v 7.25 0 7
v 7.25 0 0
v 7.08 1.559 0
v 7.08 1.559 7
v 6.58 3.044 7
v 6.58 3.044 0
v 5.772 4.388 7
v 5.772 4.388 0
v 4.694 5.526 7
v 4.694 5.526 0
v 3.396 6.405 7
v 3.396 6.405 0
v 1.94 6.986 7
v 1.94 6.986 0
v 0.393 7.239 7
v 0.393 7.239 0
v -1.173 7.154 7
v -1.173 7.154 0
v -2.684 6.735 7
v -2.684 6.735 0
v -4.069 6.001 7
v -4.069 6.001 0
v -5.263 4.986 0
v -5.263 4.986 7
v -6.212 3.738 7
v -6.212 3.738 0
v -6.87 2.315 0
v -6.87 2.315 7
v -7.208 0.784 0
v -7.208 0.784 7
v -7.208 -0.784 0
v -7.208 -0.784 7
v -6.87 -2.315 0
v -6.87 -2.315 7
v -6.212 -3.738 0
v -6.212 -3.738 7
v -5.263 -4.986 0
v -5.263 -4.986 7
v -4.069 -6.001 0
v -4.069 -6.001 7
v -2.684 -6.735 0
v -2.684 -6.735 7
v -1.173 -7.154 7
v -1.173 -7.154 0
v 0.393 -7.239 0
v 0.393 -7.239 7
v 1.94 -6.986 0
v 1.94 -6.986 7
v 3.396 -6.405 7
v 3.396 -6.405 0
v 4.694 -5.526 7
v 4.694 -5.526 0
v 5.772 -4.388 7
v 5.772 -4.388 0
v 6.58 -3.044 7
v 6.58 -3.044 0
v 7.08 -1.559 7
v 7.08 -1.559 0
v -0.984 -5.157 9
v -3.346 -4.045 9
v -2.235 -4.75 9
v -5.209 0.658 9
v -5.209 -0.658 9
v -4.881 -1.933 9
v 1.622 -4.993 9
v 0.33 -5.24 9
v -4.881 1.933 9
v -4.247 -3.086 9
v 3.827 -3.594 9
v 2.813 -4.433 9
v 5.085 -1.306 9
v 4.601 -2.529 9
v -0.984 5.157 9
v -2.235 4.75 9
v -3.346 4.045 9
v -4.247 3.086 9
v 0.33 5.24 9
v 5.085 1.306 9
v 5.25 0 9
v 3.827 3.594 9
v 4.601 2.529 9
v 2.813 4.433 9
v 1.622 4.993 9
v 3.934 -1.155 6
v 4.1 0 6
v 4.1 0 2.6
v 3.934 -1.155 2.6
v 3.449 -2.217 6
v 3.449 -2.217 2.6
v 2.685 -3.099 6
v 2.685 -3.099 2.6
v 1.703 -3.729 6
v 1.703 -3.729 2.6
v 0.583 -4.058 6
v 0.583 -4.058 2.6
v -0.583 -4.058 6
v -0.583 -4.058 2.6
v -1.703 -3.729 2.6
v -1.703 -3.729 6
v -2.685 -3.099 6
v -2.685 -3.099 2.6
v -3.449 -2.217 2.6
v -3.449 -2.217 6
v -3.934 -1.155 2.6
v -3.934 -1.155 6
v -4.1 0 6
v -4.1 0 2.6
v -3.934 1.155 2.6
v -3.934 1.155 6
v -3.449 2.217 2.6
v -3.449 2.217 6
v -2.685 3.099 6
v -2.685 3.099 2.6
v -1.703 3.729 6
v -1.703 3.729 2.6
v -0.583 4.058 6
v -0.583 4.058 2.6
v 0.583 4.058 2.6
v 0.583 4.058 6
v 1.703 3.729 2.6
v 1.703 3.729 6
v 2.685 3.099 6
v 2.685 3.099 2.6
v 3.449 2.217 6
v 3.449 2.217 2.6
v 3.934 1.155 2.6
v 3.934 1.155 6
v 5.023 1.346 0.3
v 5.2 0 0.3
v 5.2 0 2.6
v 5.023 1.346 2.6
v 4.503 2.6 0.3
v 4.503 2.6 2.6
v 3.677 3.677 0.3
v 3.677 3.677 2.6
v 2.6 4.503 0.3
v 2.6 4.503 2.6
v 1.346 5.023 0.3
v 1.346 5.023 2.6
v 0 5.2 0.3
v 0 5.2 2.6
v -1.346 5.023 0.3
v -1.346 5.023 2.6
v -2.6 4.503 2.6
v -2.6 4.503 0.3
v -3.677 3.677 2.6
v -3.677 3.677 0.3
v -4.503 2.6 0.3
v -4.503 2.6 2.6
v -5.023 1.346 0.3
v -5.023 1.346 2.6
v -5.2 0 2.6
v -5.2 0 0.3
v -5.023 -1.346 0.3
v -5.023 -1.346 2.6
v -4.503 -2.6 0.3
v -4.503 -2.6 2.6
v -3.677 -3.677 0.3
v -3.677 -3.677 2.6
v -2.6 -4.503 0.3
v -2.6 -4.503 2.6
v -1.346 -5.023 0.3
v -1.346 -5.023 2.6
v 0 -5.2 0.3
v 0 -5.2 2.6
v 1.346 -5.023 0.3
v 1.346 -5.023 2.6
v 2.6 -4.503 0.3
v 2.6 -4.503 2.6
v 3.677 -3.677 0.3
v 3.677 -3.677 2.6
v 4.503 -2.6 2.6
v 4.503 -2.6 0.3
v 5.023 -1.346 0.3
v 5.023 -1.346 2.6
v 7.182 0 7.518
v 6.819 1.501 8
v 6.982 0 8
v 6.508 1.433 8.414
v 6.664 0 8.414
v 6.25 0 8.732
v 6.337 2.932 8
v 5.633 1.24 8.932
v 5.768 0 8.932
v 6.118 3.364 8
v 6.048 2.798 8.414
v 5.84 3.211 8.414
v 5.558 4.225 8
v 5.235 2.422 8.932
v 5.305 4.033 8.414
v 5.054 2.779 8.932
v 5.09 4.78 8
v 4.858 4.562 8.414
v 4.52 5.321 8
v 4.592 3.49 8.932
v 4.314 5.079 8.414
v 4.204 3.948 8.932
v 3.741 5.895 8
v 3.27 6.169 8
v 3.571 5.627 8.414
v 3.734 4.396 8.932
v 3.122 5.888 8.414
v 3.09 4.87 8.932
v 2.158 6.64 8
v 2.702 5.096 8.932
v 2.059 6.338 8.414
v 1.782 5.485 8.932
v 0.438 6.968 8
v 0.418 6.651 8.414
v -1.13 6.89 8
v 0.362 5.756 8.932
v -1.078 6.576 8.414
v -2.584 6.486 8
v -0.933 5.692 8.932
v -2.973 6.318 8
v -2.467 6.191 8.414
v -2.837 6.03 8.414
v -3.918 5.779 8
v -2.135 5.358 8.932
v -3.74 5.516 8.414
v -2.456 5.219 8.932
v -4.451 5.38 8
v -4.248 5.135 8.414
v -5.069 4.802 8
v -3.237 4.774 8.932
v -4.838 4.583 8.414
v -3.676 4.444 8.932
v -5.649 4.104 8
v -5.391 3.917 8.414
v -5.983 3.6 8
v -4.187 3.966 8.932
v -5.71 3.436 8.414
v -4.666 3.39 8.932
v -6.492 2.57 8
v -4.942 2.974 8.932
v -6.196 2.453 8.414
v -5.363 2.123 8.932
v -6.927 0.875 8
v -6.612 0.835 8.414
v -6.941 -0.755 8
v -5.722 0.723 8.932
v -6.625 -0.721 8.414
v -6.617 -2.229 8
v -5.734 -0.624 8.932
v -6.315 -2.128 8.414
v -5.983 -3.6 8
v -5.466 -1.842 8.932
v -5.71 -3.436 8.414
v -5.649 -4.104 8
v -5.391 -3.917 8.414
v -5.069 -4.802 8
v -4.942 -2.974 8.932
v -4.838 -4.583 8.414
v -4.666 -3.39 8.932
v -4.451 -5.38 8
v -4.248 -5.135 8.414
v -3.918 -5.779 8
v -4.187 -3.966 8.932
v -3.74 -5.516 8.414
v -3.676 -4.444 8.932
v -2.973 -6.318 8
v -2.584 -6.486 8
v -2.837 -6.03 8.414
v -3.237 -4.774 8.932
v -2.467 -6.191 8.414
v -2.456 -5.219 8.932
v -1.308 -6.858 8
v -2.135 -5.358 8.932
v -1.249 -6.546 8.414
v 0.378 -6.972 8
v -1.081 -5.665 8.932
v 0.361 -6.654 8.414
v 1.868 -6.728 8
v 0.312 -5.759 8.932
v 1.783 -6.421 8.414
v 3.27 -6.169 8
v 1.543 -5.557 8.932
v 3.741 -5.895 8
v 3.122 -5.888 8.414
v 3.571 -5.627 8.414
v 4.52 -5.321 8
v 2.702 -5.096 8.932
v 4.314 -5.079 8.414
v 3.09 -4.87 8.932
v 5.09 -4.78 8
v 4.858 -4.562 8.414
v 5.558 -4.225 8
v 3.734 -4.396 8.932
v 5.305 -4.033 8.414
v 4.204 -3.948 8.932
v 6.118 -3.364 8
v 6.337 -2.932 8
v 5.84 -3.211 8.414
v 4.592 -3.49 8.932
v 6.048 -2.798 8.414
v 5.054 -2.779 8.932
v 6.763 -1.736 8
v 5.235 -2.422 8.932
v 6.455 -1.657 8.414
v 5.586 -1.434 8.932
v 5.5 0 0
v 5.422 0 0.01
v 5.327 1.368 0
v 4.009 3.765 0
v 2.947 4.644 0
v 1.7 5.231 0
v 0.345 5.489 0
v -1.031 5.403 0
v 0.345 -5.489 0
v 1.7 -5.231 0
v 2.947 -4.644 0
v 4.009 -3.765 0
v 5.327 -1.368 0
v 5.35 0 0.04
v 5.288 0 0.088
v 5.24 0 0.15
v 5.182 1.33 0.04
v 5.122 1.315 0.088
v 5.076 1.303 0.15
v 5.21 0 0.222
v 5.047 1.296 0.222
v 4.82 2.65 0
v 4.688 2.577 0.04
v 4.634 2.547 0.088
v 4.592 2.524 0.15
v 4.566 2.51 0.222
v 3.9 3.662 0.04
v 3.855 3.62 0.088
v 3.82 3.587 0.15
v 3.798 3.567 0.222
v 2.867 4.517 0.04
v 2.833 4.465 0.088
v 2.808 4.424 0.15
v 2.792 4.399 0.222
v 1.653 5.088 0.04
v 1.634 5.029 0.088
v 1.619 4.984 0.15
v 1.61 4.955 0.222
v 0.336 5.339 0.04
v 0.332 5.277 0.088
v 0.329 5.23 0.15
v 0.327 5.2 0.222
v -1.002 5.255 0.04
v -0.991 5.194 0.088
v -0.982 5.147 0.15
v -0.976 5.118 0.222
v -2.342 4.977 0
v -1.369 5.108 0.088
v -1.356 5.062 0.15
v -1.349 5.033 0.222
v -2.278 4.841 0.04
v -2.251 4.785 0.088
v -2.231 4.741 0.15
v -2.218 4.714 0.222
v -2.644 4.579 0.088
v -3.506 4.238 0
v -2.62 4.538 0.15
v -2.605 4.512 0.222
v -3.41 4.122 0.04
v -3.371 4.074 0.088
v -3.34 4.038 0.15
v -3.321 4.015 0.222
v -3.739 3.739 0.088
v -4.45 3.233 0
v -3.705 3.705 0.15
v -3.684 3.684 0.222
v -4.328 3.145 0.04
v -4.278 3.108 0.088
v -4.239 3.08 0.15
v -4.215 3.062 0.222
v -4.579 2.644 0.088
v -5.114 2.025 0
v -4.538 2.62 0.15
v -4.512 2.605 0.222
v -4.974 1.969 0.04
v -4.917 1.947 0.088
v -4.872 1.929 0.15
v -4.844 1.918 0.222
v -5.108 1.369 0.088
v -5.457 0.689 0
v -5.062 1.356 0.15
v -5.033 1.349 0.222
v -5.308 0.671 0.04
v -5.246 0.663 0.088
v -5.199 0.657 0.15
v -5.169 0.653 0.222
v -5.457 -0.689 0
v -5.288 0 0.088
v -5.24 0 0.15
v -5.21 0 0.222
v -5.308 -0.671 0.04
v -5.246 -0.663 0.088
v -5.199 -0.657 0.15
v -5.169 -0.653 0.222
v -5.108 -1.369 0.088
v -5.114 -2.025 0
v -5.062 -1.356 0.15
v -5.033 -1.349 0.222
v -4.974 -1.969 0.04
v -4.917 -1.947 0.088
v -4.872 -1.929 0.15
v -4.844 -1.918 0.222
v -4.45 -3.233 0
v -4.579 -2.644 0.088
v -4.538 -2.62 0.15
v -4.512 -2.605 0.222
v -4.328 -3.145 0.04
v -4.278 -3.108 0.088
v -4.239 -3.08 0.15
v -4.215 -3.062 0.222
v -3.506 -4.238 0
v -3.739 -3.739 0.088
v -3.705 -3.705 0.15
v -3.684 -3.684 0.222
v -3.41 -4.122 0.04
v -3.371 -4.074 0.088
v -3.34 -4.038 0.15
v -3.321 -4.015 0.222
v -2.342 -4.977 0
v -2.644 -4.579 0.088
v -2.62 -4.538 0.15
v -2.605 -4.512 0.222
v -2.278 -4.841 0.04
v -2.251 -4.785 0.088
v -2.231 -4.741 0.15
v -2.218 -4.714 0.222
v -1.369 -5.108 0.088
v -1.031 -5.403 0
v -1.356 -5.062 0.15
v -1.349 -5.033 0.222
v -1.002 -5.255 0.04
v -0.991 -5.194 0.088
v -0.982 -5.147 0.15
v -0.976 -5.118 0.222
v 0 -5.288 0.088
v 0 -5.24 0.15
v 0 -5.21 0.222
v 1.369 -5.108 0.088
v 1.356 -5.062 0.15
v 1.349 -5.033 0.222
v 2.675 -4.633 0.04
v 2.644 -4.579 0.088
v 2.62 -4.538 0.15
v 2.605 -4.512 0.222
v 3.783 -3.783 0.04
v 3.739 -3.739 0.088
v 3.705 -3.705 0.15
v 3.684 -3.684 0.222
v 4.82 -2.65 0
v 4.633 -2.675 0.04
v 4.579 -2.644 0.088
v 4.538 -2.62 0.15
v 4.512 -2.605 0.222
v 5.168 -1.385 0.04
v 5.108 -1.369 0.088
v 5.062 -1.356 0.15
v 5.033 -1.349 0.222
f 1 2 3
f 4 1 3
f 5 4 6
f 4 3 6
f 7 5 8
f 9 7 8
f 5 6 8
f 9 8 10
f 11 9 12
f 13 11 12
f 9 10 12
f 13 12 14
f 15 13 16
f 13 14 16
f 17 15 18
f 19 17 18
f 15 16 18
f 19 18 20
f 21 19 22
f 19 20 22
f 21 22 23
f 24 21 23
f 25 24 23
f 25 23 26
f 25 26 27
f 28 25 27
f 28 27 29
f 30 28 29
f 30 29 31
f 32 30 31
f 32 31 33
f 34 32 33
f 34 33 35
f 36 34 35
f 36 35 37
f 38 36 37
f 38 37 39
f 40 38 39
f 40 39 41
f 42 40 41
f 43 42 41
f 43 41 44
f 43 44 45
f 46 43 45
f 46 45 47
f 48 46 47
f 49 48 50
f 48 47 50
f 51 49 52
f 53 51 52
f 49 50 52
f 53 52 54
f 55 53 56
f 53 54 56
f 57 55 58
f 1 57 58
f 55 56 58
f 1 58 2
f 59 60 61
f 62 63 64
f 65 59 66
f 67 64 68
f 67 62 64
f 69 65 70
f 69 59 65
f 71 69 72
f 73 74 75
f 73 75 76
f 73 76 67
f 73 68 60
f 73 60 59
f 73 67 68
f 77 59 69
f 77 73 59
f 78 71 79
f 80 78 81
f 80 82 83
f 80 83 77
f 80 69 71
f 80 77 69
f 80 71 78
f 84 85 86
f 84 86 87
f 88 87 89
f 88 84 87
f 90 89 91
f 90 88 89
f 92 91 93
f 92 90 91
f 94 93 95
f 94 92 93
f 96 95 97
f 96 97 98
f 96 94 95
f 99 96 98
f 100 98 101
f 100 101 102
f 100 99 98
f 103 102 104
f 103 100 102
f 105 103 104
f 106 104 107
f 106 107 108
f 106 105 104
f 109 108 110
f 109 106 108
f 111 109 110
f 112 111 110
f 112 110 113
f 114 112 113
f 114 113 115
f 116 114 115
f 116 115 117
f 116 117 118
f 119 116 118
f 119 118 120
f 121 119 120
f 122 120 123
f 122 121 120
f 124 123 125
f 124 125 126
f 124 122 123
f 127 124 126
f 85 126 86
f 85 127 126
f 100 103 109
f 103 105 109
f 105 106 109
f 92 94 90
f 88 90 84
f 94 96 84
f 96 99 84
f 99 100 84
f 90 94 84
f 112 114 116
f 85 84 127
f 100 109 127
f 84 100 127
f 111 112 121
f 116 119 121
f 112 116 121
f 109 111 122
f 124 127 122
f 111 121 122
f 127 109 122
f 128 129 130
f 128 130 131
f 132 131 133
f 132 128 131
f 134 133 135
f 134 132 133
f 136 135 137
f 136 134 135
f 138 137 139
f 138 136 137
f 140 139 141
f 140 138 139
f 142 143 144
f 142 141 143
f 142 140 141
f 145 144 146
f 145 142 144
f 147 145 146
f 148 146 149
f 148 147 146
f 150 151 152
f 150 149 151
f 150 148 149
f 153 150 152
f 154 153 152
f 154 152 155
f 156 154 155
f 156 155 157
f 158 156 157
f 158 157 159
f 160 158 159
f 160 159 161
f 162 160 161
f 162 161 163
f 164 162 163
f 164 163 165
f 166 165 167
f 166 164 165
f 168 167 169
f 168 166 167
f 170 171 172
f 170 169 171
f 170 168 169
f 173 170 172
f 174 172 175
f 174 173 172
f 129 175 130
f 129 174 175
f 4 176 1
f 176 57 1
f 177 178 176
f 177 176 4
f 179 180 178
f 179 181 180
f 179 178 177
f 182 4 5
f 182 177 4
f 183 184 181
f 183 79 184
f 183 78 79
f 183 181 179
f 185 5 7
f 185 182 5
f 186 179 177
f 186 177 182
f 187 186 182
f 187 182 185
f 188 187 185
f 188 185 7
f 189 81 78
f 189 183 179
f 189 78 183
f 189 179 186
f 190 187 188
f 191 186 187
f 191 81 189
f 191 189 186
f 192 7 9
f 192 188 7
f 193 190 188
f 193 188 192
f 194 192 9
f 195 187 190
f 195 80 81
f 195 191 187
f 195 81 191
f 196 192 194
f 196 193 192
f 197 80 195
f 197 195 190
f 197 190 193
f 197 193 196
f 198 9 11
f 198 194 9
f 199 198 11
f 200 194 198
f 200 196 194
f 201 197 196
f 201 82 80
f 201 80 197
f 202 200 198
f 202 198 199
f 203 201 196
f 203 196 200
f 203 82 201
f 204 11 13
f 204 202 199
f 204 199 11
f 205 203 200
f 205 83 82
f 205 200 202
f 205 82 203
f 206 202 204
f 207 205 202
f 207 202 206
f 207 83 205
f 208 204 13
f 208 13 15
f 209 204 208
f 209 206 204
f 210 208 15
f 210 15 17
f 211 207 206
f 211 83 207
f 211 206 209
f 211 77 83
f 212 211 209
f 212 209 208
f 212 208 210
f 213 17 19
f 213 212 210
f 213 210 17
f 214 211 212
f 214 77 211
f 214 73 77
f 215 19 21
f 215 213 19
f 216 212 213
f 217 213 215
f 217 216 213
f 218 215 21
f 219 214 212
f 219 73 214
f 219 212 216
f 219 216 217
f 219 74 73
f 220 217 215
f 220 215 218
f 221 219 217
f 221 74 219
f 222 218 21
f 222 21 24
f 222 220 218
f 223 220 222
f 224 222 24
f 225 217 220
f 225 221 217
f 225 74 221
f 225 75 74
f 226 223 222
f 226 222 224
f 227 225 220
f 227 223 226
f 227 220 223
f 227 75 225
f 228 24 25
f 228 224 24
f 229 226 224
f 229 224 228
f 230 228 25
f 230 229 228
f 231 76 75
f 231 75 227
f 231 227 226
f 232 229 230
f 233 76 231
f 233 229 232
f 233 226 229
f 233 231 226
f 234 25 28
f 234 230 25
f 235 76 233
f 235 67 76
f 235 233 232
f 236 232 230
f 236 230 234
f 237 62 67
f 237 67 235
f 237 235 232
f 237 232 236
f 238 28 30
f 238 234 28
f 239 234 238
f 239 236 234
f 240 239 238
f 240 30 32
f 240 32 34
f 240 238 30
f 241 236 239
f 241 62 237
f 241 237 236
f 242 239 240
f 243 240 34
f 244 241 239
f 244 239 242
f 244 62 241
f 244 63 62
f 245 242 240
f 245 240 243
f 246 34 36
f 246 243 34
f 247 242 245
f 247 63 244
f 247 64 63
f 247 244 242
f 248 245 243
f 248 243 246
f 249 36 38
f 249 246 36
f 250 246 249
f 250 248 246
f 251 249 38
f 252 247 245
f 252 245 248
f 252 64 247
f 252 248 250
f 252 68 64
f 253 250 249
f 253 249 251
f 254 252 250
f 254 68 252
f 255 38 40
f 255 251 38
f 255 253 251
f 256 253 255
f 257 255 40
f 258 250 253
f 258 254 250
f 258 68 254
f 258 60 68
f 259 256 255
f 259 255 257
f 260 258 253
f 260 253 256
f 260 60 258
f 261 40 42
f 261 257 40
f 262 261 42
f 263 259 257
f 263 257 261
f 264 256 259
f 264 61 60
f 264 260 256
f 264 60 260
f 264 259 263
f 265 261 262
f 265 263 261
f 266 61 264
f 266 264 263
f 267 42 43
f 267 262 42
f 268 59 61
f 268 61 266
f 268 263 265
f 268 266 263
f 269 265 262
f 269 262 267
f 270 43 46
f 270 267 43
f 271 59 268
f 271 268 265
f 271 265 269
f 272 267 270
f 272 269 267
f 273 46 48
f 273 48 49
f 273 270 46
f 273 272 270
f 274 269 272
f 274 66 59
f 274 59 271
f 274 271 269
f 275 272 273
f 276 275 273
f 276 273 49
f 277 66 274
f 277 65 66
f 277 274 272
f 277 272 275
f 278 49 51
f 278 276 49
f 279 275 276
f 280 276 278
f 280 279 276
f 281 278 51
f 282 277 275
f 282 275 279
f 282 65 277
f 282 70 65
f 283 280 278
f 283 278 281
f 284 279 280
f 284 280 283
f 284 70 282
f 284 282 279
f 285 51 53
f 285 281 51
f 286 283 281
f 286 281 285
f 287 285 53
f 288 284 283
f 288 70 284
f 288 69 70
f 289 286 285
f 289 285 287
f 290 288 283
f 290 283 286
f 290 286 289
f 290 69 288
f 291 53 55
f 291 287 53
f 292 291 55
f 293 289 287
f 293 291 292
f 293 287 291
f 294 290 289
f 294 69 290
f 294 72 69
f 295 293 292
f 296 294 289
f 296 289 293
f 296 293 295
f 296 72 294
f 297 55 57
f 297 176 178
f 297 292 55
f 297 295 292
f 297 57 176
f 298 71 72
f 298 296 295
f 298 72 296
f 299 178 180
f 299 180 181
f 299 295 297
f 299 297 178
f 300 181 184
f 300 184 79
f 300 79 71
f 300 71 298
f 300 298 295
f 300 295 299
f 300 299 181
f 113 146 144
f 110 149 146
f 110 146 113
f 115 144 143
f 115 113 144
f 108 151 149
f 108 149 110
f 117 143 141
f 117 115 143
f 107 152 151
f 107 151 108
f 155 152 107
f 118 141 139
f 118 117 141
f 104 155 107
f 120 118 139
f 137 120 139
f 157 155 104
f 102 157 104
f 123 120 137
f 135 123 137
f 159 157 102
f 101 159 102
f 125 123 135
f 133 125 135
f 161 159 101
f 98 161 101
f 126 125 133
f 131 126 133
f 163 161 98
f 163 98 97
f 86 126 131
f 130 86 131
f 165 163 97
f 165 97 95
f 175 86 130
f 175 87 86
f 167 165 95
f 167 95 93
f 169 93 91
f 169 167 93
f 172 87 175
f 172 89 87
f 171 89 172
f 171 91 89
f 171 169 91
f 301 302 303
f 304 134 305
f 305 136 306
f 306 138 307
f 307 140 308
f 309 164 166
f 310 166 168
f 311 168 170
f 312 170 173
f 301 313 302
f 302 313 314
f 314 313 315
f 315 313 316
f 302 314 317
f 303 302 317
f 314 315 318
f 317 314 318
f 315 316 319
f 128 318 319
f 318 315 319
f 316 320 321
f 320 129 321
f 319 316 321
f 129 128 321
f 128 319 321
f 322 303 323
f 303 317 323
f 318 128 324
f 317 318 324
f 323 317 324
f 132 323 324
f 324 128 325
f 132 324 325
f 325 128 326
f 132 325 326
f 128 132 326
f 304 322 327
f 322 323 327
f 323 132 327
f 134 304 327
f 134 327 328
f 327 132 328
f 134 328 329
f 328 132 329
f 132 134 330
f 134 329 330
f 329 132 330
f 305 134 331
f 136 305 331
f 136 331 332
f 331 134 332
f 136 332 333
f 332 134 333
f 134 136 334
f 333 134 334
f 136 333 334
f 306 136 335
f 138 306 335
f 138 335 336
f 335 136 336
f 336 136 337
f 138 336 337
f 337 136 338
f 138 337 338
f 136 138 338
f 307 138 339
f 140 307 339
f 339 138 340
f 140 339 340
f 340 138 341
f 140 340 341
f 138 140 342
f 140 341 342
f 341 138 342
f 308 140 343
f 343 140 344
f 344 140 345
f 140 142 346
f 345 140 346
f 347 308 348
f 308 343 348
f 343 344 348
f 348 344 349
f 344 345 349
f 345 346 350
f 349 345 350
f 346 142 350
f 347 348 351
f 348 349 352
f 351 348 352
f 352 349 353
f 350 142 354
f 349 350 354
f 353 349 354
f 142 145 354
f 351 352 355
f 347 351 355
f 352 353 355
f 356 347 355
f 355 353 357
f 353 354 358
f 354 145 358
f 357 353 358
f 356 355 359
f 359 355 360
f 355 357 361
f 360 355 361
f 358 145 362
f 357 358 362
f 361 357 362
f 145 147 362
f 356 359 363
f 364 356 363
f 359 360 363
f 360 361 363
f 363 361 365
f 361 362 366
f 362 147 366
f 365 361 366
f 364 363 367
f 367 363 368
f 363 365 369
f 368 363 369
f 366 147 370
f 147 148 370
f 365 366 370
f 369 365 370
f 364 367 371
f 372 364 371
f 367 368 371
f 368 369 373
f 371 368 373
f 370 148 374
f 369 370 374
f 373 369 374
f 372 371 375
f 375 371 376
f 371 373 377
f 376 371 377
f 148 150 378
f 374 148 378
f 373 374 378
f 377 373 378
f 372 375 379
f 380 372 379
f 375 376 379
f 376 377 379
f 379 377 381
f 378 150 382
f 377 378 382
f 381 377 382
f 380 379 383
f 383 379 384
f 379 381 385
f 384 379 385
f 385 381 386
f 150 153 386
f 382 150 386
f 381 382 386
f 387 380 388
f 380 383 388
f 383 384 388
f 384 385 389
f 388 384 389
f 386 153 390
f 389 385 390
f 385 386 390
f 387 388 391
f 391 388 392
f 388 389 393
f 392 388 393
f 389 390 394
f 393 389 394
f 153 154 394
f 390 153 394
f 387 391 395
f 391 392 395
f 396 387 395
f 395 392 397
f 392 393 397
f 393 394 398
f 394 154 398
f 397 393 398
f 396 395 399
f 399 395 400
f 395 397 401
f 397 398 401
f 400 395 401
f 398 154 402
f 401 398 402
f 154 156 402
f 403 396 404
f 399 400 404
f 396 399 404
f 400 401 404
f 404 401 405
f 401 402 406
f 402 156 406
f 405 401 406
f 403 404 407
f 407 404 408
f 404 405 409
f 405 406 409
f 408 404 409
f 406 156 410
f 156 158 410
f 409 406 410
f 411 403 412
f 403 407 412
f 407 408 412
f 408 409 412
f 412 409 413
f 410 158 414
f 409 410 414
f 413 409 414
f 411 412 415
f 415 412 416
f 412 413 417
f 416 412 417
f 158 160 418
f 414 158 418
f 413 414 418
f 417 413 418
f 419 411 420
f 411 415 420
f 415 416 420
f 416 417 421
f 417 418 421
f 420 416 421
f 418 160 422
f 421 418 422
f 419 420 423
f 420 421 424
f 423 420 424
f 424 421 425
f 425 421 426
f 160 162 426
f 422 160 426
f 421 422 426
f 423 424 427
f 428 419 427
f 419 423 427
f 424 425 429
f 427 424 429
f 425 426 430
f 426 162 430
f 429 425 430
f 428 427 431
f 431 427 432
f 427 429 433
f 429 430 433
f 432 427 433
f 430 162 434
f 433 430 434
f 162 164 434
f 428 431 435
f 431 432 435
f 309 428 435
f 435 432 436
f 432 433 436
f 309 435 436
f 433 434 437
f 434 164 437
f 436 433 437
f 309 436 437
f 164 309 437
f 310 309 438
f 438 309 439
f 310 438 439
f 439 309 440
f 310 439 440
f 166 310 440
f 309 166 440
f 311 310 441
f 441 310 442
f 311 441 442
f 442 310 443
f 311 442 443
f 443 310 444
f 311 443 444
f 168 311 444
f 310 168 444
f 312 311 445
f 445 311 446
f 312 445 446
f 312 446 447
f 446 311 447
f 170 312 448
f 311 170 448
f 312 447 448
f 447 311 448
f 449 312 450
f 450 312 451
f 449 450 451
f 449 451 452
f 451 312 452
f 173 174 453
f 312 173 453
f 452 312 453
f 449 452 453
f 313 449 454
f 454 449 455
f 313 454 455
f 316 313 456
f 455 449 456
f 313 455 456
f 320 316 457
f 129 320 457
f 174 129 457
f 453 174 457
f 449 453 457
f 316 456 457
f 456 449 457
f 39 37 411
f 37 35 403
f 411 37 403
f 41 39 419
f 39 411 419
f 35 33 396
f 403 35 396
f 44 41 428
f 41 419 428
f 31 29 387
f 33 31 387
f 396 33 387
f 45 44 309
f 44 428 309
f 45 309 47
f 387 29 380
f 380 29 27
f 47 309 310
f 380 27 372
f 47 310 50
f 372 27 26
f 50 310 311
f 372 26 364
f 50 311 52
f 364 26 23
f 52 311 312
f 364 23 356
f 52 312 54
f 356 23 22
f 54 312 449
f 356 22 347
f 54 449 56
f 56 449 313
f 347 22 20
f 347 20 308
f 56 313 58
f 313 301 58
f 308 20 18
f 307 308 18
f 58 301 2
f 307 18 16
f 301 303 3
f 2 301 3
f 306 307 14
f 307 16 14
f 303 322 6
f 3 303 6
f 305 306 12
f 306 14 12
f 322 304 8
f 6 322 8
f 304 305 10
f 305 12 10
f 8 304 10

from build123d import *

# Parameters (mm, degrees)
SKETCH_R      = 7.25
SKETCH_R_2    = 5.2
PAD_DEPTH     = 6
SKETCH001_R   = 7.25
PAD001_DEPTH  = 3
FILLET_R      = 2
FILLET001_R   = 0.3
SKETCH002_R   = 5.2
SKETCH002_R_2 = 4.1
PAD002_DEPTH  = 3.4


with BuildPart() as part:
    # Sketch → Pad (new body)
    with BuildSketch(Plane.XY):
        Circle(SKETCH_R)
        Circle(SKETCH_R_2, mode=Mode.SUBTRACT)
    extrude(amount=PAD_DEPTH)

    # Sketch001 (on Face4 of Pad) → Pad001 (join)
    with BuildSketch(Plane.XY.offset(6)):
        Circle(SKETCH001_R)
    extrude(amount=PAD001_DEPTH)

    # Fillet
    fillet_edges = [part.edges().sort_by_distance(p)[0] for p in [
        (-7.25, 0, 9),
    ]]
    fillet(fillet_edges, radius=FILLET_R)

    # Fillet001
    fillet001_edges = [part.edges().sort_by_distance(p)[0] for p in [
        (-5.2, 0, 0),
    ]]
    fillet(fillet001_edges, radius=FILLET001_R)

    # Sketch002 (on Face6 of Fillet001) → Pad002 (join)
    with BuildSketch(Plane(origin=(0, 0, 6), x_dir=(1, 0, 0), z_dir=(0, 0, -1))):
        Circle(SKETCH002_R)
        Circle(SKETCH002_R_2, mode=Mode.SUBTRACT)
    extrude(amount=PAD002_DEPTH)


solid = part.part
